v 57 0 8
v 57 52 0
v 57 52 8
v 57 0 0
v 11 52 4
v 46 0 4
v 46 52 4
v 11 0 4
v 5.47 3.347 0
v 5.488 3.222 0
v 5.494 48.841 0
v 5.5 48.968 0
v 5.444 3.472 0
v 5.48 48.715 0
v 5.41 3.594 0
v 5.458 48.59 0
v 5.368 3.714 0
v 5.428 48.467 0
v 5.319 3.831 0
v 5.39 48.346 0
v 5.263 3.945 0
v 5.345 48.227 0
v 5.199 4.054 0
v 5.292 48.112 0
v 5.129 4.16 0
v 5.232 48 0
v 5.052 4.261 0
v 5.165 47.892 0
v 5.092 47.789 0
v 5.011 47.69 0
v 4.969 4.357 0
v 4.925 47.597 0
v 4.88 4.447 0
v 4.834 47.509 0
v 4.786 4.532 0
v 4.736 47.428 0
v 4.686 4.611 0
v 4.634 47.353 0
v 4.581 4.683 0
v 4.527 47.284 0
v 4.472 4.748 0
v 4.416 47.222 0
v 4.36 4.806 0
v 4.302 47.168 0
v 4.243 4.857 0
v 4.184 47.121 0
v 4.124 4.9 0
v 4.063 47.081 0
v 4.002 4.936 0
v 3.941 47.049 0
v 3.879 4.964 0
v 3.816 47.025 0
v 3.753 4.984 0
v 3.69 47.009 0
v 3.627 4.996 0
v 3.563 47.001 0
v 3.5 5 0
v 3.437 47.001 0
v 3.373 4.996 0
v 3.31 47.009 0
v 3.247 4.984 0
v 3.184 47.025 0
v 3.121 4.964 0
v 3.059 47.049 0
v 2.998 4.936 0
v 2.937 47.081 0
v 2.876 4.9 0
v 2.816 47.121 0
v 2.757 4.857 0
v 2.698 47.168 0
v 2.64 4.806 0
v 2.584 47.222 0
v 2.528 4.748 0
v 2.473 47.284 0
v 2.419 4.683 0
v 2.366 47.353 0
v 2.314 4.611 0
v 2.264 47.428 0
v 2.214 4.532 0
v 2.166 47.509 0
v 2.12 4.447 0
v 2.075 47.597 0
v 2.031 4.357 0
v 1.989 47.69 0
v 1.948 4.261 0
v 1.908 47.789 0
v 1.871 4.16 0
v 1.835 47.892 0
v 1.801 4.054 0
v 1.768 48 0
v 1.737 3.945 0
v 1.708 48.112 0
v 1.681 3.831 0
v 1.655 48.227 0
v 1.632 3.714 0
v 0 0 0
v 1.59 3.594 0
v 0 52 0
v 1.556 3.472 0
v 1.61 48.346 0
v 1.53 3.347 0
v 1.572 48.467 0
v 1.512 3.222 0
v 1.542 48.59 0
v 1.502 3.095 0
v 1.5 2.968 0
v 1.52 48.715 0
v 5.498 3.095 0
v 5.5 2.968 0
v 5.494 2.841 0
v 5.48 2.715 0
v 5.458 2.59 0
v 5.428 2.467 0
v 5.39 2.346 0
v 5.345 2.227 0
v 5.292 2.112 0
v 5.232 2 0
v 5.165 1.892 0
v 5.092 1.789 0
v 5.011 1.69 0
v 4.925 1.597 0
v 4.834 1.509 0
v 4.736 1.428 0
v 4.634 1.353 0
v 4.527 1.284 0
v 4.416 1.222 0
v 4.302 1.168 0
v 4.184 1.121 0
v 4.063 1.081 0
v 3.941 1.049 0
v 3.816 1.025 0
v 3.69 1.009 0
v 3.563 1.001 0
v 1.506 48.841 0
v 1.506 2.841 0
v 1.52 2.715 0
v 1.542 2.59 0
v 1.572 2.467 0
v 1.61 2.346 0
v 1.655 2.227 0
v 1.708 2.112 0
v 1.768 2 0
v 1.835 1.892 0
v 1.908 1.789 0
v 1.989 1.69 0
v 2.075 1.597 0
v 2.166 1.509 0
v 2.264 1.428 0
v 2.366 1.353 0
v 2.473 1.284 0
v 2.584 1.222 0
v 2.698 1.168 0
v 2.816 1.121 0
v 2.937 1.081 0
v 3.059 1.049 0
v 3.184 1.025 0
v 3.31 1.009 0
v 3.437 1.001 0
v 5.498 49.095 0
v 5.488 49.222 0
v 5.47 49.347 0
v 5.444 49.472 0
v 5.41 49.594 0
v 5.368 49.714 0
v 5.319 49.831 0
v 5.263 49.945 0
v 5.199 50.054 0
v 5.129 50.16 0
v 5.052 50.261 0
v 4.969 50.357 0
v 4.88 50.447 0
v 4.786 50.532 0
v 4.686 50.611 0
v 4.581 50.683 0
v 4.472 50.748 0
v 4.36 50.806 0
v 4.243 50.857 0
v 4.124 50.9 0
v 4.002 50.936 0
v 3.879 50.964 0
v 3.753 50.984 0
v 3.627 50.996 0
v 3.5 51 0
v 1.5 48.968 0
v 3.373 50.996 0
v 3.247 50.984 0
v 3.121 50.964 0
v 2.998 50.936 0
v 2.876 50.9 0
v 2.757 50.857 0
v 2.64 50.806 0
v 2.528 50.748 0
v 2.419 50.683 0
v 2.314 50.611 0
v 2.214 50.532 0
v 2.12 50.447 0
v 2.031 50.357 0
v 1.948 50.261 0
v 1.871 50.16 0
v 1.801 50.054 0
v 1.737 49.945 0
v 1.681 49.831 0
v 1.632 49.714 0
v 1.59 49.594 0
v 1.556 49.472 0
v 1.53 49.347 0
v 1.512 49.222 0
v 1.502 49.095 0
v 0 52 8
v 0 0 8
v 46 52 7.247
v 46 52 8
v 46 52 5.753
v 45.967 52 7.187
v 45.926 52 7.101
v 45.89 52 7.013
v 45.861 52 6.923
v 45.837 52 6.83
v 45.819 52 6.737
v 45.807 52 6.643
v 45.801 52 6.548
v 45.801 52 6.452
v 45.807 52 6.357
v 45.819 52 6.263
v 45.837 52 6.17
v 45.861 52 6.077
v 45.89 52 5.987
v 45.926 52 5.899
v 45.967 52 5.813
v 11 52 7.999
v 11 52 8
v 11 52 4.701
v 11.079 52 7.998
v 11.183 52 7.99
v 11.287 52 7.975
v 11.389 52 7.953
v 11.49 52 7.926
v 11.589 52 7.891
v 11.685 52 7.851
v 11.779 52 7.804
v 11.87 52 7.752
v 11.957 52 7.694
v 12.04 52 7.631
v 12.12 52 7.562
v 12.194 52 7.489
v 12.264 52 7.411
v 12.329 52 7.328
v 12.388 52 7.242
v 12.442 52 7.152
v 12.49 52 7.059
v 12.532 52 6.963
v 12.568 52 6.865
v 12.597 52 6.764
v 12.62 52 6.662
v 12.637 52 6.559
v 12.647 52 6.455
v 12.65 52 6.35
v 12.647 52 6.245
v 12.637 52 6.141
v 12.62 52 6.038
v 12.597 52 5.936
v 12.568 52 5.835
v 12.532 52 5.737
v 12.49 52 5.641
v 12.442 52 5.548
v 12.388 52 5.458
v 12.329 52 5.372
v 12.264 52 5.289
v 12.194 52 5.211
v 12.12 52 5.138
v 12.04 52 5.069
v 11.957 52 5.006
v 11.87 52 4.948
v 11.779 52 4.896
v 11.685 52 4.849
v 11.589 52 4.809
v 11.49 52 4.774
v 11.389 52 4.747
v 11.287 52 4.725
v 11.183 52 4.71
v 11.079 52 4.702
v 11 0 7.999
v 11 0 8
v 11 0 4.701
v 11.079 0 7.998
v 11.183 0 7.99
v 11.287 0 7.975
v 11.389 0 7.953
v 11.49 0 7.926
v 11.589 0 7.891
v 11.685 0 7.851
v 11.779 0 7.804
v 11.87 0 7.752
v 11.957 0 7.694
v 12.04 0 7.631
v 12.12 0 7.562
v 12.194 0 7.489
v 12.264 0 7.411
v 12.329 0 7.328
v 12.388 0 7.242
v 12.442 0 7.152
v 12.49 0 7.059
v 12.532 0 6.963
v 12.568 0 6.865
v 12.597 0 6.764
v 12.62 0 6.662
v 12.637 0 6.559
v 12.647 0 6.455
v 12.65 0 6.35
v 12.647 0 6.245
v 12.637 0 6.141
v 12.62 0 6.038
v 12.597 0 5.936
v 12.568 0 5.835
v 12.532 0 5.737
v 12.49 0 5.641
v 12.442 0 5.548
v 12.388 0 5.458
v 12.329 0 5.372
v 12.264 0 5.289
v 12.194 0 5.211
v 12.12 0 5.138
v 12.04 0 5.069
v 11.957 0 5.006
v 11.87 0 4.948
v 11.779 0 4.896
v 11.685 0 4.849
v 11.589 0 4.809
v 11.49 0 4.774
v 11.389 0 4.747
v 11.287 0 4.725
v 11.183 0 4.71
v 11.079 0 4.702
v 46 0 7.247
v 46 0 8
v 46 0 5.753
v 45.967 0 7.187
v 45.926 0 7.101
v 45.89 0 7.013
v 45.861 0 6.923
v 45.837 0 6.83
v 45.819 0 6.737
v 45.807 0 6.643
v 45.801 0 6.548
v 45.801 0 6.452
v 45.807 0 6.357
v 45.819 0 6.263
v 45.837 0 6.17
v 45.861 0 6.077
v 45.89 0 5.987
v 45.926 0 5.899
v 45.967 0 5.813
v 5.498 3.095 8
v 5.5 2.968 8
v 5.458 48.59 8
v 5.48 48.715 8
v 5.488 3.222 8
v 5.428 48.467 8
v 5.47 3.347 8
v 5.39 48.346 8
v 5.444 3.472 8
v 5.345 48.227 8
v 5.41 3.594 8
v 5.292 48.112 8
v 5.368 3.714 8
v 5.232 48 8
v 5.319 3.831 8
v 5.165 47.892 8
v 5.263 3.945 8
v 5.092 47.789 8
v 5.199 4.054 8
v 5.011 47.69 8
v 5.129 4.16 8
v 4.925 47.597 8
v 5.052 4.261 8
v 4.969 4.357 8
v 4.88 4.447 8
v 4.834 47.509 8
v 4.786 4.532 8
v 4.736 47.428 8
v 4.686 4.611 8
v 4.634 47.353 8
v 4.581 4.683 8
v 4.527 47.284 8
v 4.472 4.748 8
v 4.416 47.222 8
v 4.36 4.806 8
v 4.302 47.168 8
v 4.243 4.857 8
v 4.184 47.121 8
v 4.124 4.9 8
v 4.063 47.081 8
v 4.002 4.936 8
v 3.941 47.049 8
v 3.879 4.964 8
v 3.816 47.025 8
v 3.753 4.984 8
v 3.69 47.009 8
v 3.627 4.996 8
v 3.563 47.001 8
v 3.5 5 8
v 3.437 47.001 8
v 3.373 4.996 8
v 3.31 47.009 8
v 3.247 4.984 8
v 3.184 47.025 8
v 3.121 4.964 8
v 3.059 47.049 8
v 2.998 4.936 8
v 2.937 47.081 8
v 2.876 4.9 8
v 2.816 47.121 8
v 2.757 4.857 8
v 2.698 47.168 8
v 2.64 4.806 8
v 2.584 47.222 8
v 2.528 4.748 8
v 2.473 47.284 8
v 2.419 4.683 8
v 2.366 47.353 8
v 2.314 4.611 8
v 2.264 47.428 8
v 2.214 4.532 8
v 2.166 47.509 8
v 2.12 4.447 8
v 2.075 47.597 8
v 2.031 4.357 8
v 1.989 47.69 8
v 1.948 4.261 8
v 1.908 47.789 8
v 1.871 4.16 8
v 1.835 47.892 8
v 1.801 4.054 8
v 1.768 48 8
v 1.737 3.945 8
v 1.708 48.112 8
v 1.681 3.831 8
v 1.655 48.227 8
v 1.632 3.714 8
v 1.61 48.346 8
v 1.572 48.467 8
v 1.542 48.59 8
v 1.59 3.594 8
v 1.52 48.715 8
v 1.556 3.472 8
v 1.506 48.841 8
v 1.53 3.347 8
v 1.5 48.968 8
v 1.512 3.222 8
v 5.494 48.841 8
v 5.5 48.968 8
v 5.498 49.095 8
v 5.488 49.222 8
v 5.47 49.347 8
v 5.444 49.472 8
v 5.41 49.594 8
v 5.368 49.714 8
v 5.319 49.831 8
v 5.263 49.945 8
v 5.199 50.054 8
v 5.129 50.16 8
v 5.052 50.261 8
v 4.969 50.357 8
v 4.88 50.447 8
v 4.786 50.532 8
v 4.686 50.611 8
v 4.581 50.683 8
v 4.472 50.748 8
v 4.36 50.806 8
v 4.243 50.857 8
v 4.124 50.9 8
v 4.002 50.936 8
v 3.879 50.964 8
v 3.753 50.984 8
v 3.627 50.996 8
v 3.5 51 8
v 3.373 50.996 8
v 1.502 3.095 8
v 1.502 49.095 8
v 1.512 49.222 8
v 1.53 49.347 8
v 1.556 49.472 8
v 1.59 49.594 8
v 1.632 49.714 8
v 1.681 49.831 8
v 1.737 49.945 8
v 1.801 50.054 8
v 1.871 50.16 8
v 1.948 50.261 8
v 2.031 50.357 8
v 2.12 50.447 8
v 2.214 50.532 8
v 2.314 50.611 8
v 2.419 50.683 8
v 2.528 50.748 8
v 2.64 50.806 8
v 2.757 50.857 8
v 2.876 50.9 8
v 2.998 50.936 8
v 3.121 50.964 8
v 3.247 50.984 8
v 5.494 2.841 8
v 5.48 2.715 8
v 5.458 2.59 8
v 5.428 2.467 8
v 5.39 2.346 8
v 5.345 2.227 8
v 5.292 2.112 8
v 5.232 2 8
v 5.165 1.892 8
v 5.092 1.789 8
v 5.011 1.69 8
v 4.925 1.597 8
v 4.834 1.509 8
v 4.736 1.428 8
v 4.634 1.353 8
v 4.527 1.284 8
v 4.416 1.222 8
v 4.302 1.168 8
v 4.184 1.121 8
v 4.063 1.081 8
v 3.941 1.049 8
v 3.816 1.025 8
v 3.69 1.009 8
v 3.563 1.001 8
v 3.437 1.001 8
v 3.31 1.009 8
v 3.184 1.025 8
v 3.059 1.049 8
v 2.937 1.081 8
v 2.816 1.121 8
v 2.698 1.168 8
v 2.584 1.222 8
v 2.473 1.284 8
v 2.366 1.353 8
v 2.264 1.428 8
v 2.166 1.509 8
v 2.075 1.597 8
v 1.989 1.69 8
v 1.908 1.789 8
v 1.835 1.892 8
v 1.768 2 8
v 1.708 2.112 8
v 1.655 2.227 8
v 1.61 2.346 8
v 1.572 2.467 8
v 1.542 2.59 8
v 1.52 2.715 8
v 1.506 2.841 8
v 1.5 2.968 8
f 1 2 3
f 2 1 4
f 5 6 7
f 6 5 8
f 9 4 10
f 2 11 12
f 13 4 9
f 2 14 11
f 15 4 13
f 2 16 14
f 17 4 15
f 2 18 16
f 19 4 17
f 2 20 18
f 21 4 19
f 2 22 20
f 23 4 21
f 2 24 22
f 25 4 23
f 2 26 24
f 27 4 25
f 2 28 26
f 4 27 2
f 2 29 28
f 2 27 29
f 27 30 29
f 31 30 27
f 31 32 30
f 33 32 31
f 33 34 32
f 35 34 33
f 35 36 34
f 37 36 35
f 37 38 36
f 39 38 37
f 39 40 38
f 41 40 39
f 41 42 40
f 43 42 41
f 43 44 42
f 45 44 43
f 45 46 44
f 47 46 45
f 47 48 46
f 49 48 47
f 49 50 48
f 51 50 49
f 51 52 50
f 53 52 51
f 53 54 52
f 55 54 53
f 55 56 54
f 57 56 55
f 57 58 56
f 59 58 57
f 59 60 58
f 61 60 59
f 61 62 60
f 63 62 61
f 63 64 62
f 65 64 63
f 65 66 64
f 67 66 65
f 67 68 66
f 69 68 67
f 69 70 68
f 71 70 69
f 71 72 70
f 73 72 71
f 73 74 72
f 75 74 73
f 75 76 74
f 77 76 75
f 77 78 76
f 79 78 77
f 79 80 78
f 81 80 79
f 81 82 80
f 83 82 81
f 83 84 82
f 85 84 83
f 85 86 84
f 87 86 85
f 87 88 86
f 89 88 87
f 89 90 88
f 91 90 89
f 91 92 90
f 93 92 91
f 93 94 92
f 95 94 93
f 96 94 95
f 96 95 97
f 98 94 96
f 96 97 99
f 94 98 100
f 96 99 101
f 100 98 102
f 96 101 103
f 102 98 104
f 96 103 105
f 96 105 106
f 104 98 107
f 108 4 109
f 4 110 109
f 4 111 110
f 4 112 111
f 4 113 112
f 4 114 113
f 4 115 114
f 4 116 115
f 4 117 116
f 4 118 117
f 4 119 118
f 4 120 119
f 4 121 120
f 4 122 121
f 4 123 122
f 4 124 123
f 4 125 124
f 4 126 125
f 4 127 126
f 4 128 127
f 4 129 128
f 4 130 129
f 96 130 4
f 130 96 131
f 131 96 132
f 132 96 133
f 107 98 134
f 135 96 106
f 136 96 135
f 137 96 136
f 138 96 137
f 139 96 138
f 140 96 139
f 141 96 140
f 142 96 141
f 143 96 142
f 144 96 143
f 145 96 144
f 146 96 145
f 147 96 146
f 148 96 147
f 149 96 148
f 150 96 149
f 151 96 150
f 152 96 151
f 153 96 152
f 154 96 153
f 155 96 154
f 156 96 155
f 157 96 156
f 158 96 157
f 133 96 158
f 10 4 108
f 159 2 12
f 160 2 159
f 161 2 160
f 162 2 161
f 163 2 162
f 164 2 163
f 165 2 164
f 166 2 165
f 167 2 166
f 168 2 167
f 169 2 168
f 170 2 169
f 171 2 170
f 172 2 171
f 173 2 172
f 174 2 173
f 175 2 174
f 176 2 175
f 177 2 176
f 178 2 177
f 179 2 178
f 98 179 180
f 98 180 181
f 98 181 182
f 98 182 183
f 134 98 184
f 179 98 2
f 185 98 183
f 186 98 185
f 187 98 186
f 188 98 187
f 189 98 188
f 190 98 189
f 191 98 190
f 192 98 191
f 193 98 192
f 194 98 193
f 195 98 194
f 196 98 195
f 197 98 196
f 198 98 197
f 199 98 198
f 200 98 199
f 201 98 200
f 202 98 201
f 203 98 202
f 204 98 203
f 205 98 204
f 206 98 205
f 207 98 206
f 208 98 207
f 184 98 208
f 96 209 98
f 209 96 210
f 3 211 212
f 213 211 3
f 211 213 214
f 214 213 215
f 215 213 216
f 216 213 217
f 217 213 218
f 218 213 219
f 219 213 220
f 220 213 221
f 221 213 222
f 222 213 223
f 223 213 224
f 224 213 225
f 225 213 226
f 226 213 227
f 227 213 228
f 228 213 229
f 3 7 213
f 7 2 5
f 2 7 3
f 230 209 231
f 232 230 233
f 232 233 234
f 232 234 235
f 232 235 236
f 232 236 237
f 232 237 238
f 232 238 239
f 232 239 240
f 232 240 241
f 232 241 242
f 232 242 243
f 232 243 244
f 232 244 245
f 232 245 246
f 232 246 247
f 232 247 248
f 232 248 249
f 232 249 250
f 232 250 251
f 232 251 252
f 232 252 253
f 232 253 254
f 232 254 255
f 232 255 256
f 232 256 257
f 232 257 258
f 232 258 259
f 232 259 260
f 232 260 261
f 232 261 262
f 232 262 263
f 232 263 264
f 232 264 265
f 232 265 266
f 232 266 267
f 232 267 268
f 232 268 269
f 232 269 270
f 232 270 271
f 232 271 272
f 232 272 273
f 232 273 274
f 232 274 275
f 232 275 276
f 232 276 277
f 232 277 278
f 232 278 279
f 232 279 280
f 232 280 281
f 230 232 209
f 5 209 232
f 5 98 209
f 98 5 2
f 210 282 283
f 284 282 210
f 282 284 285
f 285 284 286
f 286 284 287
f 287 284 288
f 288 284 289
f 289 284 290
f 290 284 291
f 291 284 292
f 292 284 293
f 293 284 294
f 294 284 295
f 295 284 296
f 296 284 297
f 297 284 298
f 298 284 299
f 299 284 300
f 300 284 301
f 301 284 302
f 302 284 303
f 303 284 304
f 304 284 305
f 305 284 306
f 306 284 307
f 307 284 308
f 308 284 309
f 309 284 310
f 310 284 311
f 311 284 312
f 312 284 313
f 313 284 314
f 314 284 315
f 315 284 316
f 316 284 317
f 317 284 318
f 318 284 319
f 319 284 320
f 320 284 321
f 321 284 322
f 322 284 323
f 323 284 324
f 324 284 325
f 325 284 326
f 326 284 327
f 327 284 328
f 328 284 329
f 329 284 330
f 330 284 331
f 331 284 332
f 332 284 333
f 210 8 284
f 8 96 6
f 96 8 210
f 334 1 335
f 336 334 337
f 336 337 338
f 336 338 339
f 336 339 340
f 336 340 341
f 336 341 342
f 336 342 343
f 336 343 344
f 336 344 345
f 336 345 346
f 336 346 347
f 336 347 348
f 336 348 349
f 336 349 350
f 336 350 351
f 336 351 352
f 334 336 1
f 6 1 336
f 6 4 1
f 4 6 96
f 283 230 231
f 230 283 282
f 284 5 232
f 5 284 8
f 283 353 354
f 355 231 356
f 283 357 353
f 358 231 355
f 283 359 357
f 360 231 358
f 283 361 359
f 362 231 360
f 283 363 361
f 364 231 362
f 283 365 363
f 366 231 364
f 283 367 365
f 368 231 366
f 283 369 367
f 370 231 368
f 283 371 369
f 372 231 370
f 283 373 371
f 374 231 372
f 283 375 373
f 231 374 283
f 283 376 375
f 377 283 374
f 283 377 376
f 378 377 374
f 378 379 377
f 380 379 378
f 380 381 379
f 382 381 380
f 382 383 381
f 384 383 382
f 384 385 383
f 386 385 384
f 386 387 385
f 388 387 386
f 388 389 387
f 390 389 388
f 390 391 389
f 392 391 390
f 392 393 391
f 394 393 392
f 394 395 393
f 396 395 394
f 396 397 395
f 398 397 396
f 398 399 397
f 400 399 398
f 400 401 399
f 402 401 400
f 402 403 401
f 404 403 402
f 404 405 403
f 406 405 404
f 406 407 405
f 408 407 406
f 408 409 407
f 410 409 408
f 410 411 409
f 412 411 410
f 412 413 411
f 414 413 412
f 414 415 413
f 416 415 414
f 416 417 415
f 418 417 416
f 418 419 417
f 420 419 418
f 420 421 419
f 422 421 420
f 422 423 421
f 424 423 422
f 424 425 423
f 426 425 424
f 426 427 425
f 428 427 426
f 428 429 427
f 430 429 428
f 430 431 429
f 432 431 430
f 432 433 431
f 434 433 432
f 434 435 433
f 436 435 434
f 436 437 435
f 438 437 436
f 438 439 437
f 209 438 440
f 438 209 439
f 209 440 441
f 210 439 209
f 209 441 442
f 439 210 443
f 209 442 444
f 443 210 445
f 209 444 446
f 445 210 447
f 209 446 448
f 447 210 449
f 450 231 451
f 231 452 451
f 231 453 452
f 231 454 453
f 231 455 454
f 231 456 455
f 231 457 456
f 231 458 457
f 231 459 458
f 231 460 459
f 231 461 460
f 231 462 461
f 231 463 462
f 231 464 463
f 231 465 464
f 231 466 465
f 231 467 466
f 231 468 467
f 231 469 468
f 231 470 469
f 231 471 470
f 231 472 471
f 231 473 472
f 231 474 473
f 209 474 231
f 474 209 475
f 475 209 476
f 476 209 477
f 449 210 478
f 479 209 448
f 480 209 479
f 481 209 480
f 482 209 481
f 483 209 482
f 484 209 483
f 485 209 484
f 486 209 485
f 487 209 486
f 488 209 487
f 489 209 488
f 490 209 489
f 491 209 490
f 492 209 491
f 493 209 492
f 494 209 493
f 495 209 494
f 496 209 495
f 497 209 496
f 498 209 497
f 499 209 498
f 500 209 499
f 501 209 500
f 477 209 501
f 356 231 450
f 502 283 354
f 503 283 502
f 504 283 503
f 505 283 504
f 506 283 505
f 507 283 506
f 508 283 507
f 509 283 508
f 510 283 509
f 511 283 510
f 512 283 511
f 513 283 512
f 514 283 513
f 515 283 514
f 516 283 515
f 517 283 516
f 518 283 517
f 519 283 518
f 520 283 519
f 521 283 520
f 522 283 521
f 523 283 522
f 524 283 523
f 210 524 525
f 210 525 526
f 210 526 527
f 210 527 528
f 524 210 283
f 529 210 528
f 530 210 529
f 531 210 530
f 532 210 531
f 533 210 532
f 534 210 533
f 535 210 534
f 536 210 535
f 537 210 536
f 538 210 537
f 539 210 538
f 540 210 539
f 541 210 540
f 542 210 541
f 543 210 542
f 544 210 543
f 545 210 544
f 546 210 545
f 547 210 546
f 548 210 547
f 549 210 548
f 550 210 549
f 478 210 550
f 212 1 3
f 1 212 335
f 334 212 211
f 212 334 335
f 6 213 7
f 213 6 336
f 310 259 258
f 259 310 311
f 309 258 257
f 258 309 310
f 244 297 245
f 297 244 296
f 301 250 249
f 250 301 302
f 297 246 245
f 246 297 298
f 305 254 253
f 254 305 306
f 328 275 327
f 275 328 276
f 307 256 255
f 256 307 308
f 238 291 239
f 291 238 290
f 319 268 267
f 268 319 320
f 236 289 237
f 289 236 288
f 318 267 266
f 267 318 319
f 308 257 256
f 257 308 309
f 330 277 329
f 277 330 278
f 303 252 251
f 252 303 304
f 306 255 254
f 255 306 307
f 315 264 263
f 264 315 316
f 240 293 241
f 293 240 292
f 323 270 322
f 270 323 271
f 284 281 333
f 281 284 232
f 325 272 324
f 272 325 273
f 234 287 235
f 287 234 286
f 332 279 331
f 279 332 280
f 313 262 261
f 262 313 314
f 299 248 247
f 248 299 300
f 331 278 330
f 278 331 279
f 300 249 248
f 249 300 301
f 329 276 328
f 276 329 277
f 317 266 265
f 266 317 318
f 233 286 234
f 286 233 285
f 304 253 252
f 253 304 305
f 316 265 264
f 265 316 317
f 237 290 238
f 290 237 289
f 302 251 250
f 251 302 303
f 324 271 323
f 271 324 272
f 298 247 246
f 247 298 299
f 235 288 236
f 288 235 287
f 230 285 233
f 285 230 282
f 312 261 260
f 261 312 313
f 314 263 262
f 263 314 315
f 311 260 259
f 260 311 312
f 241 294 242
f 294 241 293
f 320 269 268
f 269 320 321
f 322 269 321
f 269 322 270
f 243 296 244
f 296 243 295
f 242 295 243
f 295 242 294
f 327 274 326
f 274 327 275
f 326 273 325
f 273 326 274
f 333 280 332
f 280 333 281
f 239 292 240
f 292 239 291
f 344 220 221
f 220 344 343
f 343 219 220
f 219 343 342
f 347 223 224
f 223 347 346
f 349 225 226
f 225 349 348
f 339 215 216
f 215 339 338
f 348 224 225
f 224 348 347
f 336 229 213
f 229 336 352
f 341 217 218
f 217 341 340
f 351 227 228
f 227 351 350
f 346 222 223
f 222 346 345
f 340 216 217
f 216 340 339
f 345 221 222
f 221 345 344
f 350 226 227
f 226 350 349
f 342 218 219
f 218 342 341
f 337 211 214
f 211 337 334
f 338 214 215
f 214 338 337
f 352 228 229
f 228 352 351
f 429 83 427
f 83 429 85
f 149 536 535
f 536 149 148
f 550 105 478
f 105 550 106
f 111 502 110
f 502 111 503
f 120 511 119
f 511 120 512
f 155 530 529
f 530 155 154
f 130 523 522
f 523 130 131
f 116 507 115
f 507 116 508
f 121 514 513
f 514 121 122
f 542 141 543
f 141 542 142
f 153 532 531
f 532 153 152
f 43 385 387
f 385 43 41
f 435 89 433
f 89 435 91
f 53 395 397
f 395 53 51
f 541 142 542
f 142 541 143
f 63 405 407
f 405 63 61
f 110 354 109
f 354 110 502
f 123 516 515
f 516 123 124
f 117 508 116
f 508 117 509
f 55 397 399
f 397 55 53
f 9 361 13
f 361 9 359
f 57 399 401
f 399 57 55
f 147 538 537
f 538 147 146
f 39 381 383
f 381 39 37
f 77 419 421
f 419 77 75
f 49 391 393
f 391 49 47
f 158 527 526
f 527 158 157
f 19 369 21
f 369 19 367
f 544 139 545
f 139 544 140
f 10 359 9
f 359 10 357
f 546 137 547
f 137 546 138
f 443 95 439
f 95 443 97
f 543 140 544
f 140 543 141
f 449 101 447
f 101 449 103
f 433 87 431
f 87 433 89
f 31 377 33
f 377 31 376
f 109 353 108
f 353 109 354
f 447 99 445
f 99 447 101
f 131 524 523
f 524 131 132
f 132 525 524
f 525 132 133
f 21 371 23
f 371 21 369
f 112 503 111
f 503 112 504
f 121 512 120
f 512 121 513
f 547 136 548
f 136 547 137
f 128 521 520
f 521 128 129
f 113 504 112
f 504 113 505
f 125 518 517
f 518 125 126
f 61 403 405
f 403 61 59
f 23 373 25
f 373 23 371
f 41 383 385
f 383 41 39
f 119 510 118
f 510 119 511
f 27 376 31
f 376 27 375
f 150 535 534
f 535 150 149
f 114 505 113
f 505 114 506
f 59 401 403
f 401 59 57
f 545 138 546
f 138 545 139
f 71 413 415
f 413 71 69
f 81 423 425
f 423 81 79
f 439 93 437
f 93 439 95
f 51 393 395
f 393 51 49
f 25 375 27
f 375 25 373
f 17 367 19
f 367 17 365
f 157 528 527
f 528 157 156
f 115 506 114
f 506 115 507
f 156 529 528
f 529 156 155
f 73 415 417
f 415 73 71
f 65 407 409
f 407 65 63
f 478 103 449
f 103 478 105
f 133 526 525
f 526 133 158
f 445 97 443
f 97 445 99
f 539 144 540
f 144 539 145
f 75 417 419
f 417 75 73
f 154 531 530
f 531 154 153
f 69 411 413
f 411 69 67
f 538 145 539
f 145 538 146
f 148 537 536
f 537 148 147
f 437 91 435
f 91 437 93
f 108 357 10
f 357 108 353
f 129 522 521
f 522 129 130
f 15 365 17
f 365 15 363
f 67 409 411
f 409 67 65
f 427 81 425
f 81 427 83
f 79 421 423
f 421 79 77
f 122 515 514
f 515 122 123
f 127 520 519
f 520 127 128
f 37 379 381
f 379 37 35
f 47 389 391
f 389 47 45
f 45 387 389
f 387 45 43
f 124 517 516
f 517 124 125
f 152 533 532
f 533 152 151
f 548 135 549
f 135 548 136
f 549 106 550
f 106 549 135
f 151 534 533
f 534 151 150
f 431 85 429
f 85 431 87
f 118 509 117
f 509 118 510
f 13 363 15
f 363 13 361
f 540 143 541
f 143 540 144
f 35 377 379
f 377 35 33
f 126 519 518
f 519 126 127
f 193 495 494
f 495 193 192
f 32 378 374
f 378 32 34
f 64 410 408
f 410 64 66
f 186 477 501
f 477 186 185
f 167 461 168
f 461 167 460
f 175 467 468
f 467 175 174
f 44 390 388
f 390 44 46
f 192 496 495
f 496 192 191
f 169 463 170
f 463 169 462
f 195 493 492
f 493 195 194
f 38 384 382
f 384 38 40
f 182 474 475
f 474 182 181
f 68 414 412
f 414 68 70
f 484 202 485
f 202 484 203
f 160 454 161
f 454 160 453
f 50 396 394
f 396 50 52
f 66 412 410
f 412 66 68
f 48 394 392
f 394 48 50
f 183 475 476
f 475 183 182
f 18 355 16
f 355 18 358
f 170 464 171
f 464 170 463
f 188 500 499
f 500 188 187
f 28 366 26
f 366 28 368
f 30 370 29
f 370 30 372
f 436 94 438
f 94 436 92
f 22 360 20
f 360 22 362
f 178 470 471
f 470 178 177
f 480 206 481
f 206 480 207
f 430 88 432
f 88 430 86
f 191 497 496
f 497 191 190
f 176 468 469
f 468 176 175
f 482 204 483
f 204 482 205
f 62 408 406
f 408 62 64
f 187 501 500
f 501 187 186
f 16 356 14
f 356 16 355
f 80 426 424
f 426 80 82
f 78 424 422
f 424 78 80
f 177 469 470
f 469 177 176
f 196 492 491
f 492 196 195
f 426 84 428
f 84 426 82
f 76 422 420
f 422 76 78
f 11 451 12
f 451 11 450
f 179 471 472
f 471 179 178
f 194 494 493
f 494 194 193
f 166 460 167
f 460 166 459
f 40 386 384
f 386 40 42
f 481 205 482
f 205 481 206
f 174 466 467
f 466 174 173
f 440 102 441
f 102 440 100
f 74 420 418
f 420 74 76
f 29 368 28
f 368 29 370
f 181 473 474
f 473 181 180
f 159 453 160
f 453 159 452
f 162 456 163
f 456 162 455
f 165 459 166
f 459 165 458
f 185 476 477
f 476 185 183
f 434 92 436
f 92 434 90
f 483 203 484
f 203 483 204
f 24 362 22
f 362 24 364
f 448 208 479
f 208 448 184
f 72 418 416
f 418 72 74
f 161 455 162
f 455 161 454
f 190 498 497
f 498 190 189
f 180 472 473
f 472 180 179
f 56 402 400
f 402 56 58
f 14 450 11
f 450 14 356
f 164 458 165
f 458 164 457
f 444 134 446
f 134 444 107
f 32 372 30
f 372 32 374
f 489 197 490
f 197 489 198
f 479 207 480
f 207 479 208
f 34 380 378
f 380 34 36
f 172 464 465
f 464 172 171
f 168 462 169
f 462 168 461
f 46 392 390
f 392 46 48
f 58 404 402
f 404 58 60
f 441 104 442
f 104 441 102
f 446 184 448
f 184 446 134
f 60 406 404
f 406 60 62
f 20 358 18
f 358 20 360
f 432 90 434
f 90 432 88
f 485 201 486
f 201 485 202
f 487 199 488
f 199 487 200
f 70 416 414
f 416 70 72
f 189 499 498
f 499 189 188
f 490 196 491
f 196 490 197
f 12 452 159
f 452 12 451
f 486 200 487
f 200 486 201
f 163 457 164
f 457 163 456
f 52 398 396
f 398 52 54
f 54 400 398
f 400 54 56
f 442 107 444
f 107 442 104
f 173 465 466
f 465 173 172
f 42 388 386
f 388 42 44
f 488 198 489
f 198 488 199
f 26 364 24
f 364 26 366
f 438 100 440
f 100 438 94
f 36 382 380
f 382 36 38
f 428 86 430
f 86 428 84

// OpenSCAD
width = 52;
$fn = 99;
length = 57;

difference() {
  union() {
    cube([length, width, 4], false);
    cube([11, width, 8], false);
    translate([length - 11, 0, 0]) {
      cube([11, width, 8], false);
    }

    translate([11, 0, 6.35]) {
      rotate([270, 0, 0]) {
        cylinder(width, 1.65, 1.65, false);
      }
    }

    translate([length - 11 + 1.3, 0, 6.5]) {
      rotate([270, 0, 0]) {
        cylinder(width, 1.5, 1.5, false);
      }
    }
  }

  // drill holes for the screws
  translate([0, -4, 1]) {
    rotate([90, 00, 90]) {
      translate([7, 8, 3.5]) {
        rotate([90, 0, 0]) {
          cylinder(h=10, d=4, center=false){}
        }
      }

      translate([60 - 7, 8, 3.5]) {
        rotate([90, 0, 0]) {
          cylinder(h=10, d=4, center=false){}
        }
      }
    }
  }
}
